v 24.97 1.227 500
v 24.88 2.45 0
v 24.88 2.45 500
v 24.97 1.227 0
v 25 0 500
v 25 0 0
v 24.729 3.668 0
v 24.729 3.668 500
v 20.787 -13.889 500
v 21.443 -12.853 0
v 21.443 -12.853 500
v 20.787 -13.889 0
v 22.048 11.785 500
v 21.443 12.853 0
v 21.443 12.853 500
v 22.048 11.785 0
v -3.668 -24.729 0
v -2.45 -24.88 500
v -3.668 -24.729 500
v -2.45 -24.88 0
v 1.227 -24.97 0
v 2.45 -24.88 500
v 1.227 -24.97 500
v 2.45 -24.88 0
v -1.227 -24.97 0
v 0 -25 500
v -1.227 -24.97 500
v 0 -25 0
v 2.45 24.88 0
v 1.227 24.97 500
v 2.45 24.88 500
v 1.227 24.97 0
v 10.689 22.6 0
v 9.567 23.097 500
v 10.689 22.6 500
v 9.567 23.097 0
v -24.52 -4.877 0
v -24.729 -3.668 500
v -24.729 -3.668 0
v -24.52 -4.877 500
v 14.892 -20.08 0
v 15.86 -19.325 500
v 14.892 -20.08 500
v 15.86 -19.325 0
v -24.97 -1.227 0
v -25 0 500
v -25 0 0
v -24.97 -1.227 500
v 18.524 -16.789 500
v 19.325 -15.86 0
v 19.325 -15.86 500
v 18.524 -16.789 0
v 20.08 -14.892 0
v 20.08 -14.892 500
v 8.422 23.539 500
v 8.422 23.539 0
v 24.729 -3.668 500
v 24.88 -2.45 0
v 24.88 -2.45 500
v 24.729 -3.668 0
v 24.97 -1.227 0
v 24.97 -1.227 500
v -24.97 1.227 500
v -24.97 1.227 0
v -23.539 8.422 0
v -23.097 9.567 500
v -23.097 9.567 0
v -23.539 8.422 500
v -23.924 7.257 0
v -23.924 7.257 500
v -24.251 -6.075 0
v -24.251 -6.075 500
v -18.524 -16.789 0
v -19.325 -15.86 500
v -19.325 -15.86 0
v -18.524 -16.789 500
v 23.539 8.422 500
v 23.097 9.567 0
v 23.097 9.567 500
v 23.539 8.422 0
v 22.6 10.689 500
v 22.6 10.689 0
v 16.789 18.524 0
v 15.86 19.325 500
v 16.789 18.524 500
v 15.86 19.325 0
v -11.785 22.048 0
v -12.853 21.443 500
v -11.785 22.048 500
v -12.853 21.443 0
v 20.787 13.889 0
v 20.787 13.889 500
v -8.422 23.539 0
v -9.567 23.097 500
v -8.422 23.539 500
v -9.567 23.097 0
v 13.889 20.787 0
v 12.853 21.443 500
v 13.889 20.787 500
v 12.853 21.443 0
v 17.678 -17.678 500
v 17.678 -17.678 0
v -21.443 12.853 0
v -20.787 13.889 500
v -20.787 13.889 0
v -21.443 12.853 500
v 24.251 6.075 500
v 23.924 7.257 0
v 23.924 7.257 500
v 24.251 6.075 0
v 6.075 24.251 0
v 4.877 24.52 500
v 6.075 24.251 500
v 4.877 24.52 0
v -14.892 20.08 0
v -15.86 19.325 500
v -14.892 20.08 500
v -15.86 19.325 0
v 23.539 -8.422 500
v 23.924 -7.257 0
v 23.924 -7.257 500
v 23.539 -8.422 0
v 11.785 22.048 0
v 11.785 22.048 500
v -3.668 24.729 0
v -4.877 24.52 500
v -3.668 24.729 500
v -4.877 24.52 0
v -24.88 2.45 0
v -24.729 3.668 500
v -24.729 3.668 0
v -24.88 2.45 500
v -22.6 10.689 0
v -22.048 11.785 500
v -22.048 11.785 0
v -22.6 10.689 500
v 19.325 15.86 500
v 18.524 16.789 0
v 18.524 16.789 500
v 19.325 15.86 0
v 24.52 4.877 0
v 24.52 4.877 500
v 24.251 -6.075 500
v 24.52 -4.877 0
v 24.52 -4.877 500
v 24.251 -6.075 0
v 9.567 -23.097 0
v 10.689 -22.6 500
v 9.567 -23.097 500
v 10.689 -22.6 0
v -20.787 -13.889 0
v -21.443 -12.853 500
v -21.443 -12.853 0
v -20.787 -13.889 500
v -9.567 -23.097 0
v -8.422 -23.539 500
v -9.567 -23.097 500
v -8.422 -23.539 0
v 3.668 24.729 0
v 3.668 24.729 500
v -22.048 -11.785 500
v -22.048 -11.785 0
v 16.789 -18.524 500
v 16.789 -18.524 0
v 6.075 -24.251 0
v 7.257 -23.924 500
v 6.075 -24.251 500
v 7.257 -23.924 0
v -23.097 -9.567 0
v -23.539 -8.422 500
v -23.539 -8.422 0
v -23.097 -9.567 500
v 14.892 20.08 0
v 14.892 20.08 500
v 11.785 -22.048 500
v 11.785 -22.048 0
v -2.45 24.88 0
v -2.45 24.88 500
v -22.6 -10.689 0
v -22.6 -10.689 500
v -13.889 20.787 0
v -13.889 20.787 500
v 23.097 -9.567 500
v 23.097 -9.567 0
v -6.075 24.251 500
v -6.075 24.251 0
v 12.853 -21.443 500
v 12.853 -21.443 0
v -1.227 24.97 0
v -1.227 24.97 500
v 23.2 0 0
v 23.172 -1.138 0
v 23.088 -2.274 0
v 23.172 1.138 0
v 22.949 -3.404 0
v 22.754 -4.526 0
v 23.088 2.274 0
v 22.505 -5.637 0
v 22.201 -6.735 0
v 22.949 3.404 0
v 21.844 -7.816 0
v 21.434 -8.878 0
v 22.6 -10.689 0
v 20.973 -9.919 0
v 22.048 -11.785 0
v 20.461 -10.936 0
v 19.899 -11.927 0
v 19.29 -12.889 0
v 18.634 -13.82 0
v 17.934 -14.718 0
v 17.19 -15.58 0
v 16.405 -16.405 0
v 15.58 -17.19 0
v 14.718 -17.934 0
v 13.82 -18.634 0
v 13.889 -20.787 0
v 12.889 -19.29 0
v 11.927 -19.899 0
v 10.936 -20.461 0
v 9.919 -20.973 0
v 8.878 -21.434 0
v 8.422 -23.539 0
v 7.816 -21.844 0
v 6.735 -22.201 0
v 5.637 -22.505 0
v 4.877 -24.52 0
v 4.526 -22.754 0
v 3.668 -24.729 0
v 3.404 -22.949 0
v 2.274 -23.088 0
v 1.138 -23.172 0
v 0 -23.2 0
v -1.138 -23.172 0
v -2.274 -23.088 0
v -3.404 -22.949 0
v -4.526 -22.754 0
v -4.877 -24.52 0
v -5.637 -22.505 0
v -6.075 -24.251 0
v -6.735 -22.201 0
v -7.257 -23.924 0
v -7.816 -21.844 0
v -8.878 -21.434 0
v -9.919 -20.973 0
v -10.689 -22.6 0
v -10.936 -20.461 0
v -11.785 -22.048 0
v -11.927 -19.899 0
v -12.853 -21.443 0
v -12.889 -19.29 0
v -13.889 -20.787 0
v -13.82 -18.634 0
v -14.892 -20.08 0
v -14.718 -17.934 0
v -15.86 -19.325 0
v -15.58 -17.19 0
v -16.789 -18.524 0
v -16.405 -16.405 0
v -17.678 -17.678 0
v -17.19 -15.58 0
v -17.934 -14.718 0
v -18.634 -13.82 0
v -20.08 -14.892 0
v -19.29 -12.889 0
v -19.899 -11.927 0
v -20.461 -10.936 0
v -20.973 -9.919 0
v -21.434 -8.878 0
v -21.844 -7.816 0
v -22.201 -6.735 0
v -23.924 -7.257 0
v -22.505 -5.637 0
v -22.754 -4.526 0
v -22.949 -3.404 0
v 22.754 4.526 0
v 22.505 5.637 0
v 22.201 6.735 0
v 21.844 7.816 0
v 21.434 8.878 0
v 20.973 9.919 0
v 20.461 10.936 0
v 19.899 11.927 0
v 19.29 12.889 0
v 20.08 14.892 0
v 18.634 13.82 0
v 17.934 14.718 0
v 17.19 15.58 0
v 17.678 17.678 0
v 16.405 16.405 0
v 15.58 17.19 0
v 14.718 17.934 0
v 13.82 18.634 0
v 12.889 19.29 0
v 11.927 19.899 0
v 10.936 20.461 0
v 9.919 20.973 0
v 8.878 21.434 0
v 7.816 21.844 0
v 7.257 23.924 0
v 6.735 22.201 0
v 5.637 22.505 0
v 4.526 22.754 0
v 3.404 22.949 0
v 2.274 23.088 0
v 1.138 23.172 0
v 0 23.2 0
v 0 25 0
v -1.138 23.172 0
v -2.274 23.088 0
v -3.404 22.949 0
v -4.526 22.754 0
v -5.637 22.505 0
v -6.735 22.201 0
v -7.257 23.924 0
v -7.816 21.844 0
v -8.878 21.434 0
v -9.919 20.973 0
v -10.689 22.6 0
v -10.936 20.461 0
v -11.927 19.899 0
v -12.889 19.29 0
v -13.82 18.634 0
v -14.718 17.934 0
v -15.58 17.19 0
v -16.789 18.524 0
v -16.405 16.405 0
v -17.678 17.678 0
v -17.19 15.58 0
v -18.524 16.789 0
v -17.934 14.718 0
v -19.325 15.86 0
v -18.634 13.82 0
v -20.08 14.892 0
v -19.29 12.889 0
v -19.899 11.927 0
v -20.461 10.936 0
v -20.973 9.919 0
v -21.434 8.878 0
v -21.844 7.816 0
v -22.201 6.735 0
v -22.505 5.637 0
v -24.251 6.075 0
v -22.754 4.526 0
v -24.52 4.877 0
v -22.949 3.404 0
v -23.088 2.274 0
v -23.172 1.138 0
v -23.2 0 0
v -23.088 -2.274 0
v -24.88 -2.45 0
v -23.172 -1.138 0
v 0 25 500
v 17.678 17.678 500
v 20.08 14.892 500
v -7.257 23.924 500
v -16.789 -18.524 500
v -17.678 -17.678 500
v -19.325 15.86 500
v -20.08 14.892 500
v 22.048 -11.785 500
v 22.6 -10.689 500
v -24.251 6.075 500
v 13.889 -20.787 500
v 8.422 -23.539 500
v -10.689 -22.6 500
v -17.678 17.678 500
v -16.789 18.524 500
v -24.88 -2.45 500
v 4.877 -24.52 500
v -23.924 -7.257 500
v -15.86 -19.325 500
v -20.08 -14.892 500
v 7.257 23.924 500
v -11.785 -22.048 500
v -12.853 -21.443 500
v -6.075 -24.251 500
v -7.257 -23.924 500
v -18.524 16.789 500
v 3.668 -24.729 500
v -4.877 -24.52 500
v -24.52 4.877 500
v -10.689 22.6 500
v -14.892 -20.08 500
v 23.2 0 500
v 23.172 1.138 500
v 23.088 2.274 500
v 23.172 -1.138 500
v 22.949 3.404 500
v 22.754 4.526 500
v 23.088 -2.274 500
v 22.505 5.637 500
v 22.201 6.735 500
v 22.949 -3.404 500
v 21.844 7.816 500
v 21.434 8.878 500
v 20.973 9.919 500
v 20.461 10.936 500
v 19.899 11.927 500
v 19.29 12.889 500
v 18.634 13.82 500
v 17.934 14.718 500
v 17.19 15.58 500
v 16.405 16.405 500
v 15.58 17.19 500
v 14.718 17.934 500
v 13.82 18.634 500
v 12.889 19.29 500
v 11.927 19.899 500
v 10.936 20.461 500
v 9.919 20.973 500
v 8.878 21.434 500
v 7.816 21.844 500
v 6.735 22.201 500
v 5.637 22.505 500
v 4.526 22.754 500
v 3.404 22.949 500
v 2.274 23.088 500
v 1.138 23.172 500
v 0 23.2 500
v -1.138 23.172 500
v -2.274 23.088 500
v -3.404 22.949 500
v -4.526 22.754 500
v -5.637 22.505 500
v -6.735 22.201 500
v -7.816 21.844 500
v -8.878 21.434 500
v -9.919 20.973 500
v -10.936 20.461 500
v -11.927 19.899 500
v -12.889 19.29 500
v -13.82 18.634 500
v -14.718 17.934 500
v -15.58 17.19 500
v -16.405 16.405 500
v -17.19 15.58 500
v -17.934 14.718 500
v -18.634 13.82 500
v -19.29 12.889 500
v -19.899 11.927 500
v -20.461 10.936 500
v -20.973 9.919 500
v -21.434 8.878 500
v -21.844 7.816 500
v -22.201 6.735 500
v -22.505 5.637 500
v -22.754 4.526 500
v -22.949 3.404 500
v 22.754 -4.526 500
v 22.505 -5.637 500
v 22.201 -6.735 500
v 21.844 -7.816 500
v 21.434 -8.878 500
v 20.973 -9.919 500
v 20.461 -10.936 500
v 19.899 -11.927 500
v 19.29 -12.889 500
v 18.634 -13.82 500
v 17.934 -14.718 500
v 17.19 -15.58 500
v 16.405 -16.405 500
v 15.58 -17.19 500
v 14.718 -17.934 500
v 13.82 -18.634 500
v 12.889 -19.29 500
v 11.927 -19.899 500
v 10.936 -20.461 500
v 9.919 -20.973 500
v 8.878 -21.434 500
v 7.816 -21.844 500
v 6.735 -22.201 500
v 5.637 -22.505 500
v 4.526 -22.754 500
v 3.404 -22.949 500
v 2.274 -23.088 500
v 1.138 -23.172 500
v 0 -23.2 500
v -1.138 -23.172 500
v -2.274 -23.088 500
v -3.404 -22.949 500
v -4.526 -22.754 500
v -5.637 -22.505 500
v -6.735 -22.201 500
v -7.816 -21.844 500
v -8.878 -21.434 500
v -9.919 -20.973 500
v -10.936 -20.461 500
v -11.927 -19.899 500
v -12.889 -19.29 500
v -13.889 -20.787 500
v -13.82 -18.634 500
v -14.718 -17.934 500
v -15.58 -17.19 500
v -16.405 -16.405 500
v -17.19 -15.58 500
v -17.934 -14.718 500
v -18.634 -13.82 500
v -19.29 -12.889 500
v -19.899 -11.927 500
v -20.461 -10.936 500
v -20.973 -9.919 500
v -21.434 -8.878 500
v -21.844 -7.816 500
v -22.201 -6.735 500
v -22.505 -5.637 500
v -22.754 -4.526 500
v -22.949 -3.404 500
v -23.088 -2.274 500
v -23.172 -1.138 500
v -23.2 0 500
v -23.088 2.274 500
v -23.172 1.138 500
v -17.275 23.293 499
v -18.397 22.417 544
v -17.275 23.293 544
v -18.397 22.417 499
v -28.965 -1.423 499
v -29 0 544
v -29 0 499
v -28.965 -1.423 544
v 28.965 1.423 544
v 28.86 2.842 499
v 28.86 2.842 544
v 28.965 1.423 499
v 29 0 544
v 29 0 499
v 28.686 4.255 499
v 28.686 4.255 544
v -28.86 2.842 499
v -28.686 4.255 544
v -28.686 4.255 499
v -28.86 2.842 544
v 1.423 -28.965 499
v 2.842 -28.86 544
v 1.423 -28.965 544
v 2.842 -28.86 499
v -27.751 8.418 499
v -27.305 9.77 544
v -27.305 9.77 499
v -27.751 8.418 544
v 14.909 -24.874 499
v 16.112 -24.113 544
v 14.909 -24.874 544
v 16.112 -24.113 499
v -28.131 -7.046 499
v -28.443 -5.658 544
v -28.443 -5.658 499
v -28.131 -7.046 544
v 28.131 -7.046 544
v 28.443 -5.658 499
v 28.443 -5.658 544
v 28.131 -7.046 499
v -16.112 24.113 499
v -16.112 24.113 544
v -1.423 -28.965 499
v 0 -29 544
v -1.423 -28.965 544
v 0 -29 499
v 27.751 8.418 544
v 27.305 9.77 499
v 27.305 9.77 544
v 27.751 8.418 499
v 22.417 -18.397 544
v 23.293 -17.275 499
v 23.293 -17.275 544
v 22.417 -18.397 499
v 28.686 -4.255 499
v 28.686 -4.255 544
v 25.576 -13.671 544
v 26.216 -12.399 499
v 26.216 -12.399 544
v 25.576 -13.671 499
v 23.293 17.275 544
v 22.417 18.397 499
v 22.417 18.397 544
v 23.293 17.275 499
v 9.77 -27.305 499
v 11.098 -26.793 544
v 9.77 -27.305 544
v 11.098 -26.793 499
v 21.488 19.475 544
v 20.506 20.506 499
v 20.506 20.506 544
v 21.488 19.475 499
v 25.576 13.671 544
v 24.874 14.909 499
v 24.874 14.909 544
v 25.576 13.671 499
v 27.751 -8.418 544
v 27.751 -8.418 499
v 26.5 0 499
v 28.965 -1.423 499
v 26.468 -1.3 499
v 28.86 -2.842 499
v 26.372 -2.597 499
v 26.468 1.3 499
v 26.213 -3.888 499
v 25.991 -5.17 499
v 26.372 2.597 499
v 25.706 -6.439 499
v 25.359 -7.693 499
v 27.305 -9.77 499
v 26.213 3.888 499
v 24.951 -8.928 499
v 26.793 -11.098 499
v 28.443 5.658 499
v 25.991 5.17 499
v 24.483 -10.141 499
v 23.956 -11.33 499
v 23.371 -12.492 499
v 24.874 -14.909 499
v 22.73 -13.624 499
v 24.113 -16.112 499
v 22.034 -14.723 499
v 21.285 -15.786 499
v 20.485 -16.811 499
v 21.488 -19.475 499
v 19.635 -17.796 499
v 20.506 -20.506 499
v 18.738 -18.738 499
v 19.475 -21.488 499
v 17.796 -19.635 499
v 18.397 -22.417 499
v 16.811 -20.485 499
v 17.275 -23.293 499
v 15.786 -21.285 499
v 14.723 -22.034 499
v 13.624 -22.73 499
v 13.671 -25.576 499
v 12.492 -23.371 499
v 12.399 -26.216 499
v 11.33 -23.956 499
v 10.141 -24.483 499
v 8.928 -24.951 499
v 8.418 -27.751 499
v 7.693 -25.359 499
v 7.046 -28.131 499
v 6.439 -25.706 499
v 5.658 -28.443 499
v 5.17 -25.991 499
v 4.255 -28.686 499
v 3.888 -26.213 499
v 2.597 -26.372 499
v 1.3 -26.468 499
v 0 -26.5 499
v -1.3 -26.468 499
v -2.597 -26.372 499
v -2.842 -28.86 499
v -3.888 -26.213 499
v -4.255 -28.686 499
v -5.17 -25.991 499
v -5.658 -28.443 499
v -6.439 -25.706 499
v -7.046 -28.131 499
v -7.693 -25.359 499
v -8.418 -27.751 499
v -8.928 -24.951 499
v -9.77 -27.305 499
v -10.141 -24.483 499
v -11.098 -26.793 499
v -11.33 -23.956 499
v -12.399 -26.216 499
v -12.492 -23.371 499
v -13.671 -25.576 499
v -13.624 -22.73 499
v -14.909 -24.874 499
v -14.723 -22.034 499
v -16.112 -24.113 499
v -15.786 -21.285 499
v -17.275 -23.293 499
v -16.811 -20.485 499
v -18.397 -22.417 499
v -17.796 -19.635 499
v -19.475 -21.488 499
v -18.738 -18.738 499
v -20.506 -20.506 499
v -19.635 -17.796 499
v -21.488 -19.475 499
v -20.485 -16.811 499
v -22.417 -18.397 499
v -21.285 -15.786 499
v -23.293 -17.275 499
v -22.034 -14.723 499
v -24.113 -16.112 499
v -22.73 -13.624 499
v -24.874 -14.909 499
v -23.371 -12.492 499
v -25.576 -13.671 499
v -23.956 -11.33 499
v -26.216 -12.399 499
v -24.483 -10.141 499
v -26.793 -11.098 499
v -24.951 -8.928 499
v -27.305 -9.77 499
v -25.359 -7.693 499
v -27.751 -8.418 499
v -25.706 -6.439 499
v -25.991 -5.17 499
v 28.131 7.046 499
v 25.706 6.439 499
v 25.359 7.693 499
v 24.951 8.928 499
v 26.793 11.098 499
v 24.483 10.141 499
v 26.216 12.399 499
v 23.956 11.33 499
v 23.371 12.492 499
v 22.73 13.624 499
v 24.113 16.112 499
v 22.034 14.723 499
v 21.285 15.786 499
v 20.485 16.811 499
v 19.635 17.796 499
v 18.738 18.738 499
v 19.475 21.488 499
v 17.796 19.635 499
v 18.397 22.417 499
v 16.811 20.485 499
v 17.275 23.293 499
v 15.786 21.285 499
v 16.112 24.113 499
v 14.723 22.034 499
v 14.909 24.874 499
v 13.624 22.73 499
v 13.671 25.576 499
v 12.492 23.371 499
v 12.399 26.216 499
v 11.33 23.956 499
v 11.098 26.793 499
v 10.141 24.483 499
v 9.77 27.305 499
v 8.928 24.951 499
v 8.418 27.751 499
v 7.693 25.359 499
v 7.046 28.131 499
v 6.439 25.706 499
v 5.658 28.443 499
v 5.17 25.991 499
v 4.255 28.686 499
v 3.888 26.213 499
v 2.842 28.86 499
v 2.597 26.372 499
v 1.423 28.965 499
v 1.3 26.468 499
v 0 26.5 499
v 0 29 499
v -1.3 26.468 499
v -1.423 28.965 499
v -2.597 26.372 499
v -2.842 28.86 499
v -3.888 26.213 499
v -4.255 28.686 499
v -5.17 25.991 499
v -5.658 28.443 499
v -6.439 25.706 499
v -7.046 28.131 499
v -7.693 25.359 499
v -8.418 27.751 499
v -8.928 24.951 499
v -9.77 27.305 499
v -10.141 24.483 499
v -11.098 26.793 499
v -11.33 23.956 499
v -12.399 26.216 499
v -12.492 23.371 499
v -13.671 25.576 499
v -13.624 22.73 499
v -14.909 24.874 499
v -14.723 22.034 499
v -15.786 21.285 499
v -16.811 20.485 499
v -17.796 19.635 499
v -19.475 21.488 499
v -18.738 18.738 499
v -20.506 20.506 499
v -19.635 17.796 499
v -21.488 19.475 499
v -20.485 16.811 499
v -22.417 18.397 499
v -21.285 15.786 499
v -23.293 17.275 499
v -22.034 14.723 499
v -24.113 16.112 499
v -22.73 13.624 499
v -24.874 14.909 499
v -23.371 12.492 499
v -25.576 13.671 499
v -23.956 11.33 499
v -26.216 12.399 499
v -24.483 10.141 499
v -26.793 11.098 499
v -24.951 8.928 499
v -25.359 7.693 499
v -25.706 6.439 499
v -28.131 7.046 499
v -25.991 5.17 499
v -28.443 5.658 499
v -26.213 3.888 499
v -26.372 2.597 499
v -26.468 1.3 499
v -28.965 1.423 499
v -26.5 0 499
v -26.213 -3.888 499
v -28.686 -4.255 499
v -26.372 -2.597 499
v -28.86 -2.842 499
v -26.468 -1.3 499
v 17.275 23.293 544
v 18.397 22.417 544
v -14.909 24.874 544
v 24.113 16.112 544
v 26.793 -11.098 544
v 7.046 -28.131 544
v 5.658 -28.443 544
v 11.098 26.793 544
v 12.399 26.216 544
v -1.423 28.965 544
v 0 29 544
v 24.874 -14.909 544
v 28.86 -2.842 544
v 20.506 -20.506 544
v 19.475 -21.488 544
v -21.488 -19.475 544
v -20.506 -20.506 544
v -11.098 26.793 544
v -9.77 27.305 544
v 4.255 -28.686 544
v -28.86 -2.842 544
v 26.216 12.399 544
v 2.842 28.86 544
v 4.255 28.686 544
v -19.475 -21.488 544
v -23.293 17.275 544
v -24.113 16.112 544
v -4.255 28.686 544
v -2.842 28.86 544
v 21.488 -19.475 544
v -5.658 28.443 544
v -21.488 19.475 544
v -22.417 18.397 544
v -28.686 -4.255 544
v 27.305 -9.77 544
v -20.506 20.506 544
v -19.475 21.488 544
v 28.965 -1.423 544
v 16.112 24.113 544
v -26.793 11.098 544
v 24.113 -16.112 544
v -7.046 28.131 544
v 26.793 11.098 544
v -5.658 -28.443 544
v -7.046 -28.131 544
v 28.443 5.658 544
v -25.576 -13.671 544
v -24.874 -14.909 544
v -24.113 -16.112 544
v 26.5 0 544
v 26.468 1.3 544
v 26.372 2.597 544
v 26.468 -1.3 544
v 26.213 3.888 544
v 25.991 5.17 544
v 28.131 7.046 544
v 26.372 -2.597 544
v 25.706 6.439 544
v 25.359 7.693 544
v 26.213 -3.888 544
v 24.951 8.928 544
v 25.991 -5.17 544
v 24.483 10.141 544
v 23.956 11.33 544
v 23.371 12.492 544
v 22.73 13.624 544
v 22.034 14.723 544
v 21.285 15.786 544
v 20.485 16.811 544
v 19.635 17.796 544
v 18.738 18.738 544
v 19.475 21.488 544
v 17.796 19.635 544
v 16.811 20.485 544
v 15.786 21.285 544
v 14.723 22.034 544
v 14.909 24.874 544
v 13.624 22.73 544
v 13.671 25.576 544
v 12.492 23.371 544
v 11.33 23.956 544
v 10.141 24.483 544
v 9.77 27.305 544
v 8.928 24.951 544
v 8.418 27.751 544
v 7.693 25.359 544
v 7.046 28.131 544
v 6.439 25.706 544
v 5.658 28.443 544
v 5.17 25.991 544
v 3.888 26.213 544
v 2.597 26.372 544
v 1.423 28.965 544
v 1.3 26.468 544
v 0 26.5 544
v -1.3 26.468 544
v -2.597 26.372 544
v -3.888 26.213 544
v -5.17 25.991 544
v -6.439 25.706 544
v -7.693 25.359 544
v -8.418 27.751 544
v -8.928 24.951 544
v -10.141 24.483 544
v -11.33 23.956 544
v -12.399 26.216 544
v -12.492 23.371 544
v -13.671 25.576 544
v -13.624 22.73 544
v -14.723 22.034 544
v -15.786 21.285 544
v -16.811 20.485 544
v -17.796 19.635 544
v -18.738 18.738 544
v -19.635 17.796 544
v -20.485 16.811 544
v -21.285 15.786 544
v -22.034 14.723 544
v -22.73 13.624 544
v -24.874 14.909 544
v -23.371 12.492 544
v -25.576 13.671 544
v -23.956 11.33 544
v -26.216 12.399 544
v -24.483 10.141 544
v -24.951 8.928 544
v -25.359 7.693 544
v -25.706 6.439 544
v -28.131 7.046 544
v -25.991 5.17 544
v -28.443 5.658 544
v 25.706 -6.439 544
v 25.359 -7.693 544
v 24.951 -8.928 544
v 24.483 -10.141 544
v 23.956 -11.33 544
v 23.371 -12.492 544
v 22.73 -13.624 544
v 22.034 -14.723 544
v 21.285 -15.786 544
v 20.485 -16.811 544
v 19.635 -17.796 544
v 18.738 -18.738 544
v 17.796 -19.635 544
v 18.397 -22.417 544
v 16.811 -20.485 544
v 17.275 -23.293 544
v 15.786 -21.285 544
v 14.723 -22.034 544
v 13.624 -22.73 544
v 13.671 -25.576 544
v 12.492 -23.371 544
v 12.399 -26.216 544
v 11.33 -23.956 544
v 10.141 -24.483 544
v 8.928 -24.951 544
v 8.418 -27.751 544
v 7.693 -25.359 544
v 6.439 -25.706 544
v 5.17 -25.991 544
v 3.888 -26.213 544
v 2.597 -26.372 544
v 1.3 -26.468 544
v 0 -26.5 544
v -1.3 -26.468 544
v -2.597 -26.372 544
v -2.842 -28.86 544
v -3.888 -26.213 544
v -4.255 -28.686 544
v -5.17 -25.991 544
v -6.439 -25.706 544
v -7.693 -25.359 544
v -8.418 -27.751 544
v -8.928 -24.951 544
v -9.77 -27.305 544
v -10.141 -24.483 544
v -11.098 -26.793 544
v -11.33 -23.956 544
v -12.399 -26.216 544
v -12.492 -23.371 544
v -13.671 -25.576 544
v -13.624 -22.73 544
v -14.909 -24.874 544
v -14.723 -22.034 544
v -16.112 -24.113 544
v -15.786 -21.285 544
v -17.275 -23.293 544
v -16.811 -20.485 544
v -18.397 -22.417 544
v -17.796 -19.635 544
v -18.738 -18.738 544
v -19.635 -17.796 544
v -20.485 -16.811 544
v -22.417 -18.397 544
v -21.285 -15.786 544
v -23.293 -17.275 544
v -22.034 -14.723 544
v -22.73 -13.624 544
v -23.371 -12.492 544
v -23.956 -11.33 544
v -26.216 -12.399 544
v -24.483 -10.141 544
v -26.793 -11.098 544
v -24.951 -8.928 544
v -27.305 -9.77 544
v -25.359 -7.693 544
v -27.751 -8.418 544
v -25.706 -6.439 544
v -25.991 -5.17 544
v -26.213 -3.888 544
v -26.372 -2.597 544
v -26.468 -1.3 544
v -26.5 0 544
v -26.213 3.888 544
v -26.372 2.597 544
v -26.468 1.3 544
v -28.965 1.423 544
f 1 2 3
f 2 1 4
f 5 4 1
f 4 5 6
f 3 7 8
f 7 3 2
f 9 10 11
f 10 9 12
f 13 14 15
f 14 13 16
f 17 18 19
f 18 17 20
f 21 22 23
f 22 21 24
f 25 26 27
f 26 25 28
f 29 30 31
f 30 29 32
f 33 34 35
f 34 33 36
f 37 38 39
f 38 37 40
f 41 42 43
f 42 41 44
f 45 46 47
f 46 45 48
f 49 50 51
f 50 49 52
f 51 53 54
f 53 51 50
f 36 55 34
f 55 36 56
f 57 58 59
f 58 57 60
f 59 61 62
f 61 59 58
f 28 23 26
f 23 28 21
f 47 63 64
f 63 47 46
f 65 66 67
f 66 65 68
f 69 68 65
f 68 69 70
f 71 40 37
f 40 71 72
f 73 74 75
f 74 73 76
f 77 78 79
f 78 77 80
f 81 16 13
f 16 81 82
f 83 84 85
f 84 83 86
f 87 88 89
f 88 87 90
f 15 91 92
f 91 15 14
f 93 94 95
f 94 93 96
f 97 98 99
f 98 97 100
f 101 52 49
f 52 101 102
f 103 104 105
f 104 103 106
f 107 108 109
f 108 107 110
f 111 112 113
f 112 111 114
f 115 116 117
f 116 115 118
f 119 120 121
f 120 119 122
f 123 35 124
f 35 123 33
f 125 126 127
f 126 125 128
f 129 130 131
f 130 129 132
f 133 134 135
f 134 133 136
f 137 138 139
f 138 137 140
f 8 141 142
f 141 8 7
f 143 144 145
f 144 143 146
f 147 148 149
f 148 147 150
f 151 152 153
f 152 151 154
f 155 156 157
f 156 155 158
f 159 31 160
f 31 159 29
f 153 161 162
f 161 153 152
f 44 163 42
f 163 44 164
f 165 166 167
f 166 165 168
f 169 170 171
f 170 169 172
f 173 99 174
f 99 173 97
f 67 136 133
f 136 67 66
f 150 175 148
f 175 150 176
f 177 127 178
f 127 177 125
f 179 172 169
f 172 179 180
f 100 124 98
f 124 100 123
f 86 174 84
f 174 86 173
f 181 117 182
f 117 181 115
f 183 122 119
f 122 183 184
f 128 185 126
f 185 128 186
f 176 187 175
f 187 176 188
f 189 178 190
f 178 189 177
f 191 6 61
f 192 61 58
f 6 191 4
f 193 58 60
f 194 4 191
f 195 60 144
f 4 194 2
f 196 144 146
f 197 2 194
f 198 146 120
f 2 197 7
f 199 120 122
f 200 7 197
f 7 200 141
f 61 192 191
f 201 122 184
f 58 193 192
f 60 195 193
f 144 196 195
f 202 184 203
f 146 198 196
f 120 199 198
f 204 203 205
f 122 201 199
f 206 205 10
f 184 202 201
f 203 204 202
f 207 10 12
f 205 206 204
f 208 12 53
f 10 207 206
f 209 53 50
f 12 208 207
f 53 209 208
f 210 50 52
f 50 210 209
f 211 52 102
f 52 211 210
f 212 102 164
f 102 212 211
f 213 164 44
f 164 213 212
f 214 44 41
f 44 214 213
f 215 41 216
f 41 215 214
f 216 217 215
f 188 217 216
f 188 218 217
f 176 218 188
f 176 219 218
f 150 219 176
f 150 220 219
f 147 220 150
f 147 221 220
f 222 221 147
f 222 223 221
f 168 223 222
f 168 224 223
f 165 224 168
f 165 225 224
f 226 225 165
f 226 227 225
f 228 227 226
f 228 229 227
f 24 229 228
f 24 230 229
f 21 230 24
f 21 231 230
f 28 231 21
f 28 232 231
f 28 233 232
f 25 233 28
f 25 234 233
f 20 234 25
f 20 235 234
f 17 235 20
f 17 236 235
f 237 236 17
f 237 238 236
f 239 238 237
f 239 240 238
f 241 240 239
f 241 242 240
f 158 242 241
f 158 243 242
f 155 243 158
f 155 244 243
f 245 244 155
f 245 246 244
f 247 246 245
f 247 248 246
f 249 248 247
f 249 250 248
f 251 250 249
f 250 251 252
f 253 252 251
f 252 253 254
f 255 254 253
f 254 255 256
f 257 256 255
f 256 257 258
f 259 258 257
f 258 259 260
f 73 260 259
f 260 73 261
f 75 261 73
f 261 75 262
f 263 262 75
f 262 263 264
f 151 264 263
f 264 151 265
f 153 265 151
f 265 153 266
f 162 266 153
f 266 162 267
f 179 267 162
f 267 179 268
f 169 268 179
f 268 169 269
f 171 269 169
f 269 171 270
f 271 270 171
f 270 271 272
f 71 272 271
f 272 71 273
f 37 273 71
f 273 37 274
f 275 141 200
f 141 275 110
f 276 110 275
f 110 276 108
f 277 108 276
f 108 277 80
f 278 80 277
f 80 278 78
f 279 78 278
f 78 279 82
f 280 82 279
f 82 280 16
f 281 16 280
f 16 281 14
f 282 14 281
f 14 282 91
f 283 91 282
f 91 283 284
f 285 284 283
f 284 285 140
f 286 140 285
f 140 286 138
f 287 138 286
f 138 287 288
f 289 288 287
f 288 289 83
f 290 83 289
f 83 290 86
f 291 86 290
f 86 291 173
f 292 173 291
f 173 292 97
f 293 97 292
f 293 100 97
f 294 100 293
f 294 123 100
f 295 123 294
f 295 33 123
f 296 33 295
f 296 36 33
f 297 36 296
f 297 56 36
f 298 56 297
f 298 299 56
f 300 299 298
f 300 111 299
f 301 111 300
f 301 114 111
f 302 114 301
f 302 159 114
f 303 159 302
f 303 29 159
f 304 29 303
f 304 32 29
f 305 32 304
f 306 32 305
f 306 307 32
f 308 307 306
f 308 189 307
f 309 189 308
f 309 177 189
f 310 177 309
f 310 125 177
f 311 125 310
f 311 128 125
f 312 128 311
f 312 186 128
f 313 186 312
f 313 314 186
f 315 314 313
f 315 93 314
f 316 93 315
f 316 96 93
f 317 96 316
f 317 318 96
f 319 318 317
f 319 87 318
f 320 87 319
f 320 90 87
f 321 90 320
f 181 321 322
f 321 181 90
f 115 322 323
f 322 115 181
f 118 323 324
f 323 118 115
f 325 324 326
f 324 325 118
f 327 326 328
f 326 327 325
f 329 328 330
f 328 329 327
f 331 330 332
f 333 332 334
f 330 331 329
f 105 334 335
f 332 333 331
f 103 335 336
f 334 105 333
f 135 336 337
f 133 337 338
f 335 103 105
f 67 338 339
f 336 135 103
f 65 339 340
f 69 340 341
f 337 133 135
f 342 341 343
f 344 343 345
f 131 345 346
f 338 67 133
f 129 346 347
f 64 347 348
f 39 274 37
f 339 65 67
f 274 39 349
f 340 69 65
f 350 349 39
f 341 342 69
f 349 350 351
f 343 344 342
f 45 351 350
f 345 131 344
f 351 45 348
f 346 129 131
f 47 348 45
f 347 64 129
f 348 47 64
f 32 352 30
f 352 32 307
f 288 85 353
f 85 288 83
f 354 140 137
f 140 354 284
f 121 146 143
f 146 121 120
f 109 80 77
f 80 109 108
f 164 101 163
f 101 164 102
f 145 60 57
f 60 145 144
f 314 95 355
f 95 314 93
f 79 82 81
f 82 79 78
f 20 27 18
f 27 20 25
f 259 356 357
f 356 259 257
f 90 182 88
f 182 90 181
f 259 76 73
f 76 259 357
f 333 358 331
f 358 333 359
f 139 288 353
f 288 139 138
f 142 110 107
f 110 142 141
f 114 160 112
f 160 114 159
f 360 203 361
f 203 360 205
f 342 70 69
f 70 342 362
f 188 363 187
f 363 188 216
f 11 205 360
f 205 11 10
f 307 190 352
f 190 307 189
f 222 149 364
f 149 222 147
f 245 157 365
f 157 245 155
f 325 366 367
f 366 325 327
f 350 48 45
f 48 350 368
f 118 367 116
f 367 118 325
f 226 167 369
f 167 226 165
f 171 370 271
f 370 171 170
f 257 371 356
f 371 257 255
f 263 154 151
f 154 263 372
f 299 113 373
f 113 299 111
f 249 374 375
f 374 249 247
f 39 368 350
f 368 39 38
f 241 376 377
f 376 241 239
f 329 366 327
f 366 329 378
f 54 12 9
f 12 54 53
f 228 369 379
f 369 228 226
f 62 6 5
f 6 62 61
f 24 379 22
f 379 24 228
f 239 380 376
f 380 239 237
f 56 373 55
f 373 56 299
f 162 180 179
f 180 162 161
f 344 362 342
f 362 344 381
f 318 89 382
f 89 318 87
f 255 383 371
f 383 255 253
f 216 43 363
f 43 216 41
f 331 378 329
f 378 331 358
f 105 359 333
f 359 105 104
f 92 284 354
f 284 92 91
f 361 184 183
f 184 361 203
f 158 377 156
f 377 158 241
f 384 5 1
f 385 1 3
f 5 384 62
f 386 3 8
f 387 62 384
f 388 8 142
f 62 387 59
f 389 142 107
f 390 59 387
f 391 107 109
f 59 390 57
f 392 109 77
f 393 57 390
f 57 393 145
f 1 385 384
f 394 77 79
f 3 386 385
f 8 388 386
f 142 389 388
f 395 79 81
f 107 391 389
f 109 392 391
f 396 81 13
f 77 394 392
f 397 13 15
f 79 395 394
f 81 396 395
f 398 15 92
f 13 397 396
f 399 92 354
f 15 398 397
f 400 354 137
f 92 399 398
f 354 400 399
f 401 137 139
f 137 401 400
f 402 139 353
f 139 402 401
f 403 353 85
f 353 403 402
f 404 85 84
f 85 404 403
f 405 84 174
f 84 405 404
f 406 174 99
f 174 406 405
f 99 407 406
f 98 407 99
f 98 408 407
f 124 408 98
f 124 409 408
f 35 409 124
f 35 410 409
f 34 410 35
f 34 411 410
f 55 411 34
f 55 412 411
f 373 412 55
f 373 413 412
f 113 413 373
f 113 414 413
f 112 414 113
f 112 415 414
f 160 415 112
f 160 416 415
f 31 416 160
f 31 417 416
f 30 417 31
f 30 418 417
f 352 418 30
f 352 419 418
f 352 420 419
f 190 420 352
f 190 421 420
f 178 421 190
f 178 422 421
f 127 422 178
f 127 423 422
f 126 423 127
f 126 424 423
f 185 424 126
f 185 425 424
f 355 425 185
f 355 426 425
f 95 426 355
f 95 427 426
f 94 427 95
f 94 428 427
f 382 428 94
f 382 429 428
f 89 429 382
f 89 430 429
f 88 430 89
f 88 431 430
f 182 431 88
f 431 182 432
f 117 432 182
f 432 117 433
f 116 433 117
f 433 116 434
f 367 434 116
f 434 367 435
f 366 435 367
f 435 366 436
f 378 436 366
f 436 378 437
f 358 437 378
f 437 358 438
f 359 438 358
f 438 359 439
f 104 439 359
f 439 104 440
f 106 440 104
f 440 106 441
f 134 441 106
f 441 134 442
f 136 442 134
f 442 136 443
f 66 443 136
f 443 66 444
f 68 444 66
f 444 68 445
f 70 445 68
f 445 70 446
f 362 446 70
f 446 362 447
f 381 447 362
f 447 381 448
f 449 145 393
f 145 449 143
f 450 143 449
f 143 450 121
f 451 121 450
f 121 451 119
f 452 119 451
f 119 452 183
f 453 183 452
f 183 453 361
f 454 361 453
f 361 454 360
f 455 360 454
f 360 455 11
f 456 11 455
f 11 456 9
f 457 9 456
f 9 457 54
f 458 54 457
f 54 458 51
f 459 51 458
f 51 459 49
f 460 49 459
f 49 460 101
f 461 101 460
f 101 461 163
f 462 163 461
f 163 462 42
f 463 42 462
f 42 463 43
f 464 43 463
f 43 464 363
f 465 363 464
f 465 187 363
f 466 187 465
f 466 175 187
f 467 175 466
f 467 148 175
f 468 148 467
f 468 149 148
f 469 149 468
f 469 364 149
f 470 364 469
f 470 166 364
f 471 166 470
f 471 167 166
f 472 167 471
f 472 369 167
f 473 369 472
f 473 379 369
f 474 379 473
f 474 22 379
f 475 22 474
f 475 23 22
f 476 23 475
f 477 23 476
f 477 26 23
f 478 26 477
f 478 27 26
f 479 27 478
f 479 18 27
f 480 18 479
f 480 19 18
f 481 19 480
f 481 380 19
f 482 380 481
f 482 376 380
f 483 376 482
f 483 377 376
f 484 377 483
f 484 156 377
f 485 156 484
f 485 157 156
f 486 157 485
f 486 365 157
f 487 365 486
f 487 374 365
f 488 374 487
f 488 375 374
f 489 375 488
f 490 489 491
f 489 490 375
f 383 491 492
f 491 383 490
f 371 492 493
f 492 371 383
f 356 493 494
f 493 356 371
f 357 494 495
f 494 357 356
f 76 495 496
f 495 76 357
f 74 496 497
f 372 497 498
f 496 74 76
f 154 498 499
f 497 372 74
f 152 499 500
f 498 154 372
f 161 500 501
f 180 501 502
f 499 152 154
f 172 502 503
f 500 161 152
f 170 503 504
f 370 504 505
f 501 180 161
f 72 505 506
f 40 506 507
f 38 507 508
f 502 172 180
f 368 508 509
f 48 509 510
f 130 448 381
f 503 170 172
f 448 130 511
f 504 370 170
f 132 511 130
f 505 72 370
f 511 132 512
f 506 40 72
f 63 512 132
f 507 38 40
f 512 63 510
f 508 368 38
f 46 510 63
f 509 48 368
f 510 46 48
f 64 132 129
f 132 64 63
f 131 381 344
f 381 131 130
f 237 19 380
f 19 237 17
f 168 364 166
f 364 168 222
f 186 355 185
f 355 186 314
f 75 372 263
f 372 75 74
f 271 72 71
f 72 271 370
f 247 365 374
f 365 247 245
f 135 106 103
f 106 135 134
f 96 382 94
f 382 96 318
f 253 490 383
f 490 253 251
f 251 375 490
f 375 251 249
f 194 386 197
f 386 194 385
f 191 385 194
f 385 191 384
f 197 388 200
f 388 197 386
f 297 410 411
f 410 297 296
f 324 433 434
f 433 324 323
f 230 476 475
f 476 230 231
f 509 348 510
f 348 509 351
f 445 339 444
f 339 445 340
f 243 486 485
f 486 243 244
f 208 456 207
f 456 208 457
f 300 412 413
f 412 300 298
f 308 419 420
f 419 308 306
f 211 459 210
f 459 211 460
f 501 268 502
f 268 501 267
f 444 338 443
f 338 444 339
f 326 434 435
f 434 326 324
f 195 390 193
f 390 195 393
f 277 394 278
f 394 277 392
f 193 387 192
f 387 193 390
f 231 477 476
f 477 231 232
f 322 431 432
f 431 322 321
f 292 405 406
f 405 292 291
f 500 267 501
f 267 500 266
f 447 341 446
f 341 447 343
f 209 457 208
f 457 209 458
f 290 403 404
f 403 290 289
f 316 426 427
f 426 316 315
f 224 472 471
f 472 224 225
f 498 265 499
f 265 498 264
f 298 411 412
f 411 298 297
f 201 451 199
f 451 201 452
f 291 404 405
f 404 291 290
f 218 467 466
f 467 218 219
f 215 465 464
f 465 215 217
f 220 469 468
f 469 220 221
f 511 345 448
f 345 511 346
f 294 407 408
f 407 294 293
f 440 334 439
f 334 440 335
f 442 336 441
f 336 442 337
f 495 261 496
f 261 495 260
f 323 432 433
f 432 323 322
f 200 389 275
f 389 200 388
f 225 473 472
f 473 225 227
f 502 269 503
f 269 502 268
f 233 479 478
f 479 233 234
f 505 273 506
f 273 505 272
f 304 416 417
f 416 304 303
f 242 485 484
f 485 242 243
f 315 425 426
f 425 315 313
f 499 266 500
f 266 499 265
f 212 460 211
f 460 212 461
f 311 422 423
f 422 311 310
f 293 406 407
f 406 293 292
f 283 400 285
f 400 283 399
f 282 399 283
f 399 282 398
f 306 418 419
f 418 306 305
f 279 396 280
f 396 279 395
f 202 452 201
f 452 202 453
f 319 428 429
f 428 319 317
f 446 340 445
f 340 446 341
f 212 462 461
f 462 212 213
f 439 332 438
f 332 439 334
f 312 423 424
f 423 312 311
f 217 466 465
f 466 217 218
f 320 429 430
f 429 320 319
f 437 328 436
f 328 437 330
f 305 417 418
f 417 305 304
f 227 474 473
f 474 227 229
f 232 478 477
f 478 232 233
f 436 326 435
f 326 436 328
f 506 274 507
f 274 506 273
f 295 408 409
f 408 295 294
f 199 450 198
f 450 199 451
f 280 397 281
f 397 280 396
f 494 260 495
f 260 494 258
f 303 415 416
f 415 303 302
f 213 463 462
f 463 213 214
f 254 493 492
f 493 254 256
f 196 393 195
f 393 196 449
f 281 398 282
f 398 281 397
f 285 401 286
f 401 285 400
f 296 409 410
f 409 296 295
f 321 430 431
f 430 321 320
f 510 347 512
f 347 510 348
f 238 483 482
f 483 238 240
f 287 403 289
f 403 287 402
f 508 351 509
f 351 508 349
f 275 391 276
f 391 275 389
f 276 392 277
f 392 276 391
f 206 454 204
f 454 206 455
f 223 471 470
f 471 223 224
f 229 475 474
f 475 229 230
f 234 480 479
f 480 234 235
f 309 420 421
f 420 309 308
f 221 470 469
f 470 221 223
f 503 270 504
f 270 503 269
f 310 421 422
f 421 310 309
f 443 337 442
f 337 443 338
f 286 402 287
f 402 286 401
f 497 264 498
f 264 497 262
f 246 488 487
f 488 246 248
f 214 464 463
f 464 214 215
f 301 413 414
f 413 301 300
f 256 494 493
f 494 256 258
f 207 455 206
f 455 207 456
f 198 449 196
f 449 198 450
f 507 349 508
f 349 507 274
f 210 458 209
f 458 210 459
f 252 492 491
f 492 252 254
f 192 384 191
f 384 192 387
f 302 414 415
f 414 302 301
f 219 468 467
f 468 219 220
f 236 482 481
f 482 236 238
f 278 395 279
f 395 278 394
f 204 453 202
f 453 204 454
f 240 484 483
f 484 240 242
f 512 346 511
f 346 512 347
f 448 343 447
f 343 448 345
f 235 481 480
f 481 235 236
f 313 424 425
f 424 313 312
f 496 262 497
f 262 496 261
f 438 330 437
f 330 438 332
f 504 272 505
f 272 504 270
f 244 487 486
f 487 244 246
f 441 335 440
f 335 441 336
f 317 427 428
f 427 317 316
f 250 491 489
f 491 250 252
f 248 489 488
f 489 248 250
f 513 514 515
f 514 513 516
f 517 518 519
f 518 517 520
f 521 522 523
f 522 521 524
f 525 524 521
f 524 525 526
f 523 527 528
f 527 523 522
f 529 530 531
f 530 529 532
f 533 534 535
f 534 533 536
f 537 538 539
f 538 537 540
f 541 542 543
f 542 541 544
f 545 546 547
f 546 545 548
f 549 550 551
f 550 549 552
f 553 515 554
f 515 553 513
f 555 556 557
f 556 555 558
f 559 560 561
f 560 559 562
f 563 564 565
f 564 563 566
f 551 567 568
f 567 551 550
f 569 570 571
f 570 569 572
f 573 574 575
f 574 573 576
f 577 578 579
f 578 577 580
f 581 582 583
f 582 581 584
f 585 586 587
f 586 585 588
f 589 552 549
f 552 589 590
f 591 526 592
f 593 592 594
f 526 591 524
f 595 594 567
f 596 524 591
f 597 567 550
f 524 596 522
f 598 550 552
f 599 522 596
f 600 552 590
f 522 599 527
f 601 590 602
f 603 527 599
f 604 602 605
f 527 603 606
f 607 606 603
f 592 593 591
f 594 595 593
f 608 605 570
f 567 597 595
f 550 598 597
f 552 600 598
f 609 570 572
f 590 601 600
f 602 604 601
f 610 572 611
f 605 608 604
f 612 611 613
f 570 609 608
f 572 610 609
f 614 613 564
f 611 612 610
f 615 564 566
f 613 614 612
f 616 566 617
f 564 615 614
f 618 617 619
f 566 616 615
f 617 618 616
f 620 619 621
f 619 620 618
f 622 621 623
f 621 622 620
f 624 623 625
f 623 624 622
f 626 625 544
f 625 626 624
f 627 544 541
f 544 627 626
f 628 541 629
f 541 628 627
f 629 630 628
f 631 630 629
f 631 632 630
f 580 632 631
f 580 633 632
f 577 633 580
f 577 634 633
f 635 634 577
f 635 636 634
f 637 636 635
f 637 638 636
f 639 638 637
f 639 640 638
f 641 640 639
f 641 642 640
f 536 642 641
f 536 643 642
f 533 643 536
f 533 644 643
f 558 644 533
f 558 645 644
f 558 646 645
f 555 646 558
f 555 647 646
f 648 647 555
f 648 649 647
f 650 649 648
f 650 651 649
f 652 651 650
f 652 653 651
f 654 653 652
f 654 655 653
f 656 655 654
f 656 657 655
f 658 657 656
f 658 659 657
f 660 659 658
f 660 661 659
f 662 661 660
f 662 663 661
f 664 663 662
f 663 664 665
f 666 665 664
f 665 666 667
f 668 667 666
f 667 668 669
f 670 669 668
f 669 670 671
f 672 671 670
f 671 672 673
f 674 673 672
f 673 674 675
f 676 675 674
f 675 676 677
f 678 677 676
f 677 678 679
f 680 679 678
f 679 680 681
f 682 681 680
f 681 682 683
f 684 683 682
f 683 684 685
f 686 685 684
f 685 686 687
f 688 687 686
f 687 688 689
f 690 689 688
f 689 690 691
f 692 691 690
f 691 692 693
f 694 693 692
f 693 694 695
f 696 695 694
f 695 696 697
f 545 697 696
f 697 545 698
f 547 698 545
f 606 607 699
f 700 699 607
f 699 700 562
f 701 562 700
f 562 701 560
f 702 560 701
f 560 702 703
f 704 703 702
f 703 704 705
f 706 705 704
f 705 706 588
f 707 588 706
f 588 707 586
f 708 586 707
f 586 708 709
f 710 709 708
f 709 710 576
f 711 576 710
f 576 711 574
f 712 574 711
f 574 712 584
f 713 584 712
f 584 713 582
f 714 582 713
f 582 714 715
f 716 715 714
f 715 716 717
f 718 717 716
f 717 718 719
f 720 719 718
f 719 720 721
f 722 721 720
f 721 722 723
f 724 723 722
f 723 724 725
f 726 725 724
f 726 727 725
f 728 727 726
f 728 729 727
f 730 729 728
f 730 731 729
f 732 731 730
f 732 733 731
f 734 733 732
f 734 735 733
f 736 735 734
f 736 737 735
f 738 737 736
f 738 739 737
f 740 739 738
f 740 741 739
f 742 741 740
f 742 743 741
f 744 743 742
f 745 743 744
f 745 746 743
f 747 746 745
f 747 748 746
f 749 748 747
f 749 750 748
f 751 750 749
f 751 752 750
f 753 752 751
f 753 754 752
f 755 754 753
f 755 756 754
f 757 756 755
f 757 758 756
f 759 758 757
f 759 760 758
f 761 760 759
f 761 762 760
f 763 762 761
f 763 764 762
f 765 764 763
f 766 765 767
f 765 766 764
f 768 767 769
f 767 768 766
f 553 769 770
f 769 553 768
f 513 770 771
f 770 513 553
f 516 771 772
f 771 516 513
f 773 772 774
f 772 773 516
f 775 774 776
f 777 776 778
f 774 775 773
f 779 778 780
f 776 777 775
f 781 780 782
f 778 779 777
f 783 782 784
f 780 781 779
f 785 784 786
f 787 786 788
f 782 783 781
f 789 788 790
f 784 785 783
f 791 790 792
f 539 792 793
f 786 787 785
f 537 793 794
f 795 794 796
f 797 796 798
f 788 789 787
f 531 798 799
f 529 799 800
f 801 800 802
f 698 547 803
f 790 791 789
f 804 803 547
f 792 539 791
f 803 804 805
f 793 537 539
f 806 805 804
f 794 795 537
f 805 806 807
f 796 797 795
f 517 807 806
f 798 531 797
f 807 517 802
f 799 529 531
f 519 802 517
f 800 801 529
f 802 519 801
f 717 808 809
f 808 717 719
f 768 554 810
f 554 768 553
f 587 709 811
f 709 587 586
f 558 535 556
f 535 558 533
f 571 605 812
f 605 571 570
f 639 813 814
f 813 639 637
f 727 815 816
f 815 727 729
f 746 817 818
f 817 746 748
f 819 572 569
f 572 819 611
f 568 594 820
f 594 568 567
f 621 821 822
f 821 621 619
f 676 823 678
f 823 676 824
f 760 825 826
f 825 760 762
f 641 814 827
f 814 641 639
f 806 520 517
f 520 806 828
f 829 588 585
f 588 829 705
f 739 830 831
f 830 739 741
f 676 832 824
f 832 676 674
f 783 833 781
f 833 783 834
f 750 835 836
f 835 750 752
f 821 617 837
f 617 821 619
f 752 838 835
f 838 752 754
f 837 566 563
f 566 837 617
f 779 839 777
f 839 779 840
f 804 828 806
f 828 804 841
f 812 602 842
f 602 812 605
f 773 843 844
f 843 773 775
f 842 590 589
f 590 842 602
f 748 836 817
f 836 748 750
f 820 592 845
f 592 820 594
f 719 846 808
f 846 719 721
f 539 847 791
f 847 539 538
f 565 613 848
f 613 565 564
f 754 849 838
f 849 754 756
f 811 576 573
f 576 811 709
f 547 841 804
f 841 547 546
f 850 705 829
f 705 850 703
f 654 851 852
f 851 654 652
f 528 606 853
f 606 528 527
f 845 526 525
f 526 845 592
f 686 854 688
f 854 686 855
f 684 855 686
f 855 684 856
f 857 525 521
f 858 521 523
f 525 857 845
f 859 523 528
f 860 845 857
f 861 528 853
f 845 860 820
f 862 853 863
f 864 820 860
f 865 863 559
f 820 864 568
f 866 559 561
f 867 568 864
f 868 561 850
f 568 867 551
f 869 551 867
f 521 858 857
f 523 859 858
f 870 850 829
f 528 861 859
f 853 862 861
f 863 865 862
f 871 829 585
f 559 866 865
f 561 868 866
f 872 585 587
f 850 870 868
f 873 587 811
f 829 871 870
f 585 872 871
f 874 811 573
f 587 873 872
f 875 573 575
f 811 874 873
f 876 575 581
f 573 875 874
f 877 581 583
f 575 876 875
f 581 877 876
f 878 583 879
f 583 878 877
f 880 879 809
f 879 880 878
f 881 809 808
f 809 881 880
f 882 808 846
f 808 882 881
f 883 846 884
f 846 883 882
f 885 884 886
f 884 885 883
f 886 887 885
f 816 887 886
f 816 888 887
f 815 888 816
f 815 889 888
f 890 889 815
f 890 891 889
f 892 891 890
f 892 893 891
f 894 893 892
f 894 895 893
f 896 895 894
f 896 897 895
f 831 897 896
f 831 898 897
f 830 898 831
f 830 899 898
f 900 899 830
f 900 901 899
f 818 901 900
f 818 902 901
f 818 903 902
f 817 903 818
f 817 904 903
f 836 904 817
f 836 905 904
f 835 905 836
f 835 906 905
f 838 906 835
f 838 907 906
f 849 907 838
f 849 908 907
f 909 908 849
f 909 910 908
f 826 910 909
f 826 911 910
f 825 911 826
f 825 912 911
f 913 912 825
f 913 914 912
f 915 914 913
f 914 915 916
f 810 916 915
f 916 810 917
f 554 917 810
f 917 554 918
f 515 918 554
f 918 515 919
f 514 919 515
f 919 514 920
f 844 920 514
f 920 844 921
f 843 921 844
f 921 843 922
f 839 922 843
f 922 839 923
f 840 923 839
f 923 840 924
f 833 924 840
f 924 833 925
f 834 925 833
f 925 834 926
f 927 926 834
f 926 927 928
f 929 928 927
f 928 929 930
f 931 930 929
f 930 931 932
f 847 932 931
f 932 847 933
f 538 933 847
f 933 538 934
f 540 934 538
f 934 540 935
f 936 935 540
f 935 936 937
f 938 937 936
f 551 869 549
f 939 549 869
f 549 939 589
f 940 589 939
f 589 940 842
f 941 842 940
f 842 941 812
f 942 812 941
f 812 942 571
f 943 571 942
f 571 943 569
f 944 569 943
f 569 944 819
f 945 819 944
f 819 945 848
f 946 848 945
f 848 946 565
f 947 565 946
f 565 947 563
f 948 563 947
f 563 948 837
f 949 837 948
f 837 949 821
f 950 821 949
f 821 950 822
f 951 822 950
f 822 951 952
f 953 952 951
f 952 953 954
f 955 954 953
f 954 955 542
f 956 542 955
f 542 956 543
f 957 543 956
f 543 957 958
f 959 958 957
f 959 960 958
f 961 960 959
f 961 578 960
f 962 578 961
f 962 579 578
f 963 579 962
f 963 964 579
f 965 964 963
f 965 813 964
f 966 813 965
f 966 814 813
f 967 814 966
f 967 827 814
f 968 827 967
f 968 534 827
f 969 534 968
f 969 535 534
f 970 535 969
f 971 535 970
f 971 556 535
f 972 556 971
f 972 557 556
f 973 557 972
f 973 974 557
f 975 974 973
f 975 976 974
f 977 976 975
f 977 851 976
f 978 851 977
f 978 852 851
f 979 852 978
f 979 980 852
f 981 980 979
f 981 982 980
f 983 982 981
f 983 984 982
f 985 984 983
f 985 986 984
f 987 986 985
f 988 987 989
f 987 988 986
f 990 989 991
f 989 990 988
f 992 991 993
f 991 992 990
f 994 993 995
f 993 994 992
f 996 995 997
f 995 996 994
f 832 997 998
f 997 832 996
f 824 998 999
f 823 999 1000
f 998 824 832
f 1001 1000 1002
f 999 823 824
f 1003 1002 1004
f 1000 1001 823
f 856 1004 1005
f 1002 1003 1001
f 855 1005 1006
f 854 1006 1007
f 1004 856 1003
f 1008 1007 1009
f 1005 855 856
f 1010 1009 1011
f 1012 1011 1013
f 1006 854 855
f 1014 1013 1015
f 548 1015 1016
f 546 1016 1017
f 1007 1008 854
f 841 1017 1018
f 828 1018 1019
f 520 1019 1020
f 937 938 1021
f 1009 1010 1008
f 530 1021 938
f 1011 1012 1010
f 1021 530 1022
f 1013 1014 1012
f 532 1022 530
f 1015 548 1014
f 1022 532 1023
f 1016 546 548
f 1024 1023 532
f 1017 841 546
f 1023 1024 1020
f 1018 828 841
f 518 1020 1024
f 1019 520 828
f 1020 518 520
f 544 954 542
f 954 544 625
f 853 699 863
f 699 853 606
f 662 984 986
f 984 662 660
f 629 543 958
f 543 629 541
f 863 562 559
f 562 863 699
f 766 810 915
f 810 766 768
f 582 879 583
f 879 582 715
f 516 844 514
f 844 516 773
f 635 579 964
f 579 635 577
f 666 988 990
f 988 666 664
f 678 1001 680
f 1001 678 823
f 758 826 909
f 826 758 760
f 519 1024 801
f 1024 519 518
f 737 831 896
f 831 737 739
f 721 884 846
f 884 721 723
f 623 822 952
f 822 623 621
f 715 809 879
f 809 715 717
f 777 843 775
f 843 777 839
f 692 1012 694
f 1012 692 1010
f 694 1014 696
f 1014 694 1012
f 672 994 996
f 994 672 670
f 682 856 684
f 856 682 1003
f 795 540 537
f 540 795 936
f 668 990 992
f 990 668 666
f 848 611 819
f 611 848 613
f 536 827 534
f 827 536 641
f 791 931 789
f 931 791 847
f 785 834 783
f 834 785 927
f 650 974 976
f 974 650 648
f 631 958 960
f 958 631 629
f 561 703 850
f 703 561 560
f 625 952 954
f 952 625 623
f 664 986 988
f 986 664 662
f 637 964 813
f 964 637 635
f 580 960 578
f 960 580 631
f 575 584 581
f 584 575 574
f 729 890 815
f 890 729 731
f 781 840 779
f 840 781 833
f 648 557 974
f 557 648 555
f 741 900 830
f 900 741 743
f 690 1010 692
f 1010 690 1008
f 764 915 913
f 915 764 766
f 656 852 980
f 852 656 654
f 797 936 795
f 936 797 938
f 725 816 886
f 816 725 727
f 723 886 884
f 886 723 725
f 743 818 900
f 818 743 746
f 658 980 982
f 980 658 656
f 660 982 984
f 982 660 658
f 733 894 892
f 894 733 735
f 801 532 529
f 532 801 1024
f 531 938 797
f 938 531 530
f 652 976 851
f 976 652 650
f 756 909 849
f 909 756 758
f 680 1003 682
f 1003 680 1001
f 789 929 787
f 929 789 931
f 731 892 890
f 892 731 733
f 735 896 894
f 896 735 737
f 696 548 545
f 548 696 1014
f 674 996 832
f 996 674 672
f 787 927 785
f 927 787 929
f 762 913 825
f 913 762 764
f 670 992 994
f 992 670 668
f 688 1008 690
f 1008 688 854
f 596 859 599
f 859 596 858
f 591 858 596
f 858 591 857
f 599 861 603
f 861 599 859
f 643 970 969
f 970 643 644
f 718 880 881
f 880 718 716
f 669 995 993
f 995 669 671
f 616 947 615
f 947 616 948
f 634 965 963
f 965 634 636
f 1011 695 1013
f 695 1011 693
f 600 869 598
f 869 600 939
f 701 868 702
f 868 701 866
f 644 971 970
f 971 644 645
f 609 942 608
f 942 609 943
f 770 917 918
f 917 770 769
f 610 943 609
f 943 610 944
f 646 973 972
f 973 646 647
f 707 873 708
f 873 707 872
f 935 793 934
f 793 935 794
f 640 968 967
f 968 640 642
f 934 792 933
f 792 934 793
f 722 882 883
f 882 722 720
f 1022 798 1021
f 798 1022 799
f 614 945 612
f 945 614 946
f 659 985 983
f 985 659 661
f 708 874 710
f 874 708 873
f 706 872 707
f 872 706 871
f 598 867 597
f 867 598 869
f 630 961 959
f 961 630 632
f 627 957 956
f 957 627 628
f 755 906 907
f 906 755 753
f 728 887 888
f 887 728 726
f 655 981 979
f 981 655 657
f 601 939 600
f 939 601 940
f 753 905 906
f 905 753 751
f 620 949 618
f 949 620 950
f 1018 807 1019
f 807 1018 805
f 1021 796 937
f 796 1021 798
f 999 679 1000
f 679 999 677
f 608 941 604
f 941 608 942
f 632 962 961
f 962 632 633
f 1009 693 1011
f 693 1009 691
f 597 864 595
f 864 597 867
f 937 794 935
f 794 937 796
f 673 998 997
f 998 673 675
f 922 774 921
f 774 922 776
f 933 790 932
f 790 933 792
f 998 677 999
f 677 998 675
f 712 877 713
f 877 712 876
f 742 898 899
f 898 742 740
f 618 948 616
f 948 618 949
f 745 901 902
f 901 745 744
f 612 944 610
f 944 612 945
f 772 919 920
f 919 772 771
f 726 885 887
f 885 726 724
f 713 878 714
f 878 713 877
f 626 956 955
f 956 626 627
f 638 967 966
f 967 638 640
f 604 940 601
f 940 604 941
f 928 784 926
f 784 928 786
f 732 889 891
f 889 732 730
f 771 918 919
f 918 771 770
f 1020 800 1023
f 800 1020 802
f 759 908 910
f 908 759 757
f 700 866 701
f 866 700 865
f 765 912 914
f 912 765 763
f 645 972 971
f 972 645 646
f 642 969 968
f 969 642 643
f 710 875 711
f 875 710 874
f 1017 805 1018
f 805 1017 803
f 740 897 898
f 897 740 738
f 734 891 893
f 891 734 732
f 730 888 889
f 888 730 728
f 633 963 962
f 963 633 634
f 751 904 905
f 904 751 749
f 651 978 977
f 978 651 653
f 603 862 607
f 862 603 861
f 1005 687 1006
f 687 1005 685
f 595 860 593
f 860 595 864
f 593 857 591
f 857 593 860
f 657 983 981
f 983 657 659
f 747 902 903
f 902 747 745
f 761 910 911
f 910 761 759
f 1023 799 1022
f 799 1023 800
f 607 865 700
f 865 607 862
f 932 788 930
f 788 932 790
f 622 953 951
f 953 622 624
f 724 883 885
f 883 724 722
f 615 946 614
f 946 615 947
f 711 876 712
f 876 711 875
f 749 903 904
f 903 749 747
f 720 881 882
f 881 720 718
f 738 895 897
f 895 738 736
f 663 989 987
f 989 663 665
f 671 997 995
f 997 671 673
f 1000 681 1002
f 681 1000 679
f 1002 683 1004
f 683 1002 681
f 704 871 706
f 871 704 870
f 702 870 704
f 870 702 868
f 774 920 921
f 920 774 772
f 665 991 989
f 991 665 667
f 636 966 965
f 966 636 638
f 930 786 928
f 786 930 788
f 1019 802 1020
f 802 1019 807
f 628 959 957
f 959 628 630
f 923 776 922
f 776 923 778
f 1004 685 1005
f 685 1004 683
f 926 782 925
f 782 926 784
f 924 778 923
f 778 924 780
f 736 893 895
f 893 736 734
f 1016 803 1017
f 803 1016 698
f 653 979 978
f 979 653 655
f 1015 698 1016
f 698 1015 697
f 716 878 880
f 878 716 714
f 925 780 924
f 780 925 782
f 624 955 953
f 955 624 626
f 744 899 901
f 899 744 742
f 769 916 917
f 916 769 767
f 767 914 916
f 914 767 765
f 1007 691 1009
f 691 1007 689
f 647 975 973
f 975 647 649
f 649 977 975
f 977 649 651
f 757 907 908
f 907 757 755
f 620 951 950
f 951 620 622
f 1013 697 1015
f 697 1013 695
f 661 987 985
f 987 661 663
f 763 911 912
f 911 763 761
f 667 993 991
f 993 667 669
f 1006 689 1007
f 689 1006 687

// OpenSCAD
// HT 50 pipe 500 mm (single connected solid)

// Parameters
nominal_size    = 50;   //[25:110:1]
length_mm       = 500;  //[250:1000:1]
pipe_od         = 50;   //[25:100:0.5]
wall_thickness  = 1.8;  //[0.9:3.6:0.1]
fitting_length  = 45;   //[20:90:1]
fitting_od      = 58;   //[45:90:0.5]
fitting_wall    = 2.5;  //[1.2:5:0.1]
overlap         = 1;    //[0.5:2:0.1]

$fn = 128;

module ht_pipe() {
    // Safety clamps to avoid invalid geometry
    pipe_r      = pipe_od/2;
    pipe_ir     = max(0.01, pipe_r - wall_thickness);

    fit_r       = fitting_od/2;
    fit_ir      = max(0.01, fit_r - fitting_wall);

    // Place socket at the end, overlapping into the pipe by "overlap"
    socket_z0   = length_mm - overlap;

    // Ensure inner voids fully cut through (avoid coplanar faces)
    eps = 0.05;

    color([0.85, 0.85, 0.8])
    union() {
        // Main pipe (hollow)
        difference() {
            cylinder(h=length_mm, r=pipe_r, center=false);
            translate([0, 0, -eps])
                cylinder(h=length_mm + 2*eps, r=pipe_ir, center=false);
        }

        // End socket (hollow), connected by overlap
        translate([0, 0, socket_z0])
        difference() {
            cylinder(h=fitting_length, r=fit_r, center=false);
            translate([0, 0, -eps])
                cylinder(h=fitting_length + 2*eps, r=fit_ir, center=false);
        }
    }
}

ht_pipe();
